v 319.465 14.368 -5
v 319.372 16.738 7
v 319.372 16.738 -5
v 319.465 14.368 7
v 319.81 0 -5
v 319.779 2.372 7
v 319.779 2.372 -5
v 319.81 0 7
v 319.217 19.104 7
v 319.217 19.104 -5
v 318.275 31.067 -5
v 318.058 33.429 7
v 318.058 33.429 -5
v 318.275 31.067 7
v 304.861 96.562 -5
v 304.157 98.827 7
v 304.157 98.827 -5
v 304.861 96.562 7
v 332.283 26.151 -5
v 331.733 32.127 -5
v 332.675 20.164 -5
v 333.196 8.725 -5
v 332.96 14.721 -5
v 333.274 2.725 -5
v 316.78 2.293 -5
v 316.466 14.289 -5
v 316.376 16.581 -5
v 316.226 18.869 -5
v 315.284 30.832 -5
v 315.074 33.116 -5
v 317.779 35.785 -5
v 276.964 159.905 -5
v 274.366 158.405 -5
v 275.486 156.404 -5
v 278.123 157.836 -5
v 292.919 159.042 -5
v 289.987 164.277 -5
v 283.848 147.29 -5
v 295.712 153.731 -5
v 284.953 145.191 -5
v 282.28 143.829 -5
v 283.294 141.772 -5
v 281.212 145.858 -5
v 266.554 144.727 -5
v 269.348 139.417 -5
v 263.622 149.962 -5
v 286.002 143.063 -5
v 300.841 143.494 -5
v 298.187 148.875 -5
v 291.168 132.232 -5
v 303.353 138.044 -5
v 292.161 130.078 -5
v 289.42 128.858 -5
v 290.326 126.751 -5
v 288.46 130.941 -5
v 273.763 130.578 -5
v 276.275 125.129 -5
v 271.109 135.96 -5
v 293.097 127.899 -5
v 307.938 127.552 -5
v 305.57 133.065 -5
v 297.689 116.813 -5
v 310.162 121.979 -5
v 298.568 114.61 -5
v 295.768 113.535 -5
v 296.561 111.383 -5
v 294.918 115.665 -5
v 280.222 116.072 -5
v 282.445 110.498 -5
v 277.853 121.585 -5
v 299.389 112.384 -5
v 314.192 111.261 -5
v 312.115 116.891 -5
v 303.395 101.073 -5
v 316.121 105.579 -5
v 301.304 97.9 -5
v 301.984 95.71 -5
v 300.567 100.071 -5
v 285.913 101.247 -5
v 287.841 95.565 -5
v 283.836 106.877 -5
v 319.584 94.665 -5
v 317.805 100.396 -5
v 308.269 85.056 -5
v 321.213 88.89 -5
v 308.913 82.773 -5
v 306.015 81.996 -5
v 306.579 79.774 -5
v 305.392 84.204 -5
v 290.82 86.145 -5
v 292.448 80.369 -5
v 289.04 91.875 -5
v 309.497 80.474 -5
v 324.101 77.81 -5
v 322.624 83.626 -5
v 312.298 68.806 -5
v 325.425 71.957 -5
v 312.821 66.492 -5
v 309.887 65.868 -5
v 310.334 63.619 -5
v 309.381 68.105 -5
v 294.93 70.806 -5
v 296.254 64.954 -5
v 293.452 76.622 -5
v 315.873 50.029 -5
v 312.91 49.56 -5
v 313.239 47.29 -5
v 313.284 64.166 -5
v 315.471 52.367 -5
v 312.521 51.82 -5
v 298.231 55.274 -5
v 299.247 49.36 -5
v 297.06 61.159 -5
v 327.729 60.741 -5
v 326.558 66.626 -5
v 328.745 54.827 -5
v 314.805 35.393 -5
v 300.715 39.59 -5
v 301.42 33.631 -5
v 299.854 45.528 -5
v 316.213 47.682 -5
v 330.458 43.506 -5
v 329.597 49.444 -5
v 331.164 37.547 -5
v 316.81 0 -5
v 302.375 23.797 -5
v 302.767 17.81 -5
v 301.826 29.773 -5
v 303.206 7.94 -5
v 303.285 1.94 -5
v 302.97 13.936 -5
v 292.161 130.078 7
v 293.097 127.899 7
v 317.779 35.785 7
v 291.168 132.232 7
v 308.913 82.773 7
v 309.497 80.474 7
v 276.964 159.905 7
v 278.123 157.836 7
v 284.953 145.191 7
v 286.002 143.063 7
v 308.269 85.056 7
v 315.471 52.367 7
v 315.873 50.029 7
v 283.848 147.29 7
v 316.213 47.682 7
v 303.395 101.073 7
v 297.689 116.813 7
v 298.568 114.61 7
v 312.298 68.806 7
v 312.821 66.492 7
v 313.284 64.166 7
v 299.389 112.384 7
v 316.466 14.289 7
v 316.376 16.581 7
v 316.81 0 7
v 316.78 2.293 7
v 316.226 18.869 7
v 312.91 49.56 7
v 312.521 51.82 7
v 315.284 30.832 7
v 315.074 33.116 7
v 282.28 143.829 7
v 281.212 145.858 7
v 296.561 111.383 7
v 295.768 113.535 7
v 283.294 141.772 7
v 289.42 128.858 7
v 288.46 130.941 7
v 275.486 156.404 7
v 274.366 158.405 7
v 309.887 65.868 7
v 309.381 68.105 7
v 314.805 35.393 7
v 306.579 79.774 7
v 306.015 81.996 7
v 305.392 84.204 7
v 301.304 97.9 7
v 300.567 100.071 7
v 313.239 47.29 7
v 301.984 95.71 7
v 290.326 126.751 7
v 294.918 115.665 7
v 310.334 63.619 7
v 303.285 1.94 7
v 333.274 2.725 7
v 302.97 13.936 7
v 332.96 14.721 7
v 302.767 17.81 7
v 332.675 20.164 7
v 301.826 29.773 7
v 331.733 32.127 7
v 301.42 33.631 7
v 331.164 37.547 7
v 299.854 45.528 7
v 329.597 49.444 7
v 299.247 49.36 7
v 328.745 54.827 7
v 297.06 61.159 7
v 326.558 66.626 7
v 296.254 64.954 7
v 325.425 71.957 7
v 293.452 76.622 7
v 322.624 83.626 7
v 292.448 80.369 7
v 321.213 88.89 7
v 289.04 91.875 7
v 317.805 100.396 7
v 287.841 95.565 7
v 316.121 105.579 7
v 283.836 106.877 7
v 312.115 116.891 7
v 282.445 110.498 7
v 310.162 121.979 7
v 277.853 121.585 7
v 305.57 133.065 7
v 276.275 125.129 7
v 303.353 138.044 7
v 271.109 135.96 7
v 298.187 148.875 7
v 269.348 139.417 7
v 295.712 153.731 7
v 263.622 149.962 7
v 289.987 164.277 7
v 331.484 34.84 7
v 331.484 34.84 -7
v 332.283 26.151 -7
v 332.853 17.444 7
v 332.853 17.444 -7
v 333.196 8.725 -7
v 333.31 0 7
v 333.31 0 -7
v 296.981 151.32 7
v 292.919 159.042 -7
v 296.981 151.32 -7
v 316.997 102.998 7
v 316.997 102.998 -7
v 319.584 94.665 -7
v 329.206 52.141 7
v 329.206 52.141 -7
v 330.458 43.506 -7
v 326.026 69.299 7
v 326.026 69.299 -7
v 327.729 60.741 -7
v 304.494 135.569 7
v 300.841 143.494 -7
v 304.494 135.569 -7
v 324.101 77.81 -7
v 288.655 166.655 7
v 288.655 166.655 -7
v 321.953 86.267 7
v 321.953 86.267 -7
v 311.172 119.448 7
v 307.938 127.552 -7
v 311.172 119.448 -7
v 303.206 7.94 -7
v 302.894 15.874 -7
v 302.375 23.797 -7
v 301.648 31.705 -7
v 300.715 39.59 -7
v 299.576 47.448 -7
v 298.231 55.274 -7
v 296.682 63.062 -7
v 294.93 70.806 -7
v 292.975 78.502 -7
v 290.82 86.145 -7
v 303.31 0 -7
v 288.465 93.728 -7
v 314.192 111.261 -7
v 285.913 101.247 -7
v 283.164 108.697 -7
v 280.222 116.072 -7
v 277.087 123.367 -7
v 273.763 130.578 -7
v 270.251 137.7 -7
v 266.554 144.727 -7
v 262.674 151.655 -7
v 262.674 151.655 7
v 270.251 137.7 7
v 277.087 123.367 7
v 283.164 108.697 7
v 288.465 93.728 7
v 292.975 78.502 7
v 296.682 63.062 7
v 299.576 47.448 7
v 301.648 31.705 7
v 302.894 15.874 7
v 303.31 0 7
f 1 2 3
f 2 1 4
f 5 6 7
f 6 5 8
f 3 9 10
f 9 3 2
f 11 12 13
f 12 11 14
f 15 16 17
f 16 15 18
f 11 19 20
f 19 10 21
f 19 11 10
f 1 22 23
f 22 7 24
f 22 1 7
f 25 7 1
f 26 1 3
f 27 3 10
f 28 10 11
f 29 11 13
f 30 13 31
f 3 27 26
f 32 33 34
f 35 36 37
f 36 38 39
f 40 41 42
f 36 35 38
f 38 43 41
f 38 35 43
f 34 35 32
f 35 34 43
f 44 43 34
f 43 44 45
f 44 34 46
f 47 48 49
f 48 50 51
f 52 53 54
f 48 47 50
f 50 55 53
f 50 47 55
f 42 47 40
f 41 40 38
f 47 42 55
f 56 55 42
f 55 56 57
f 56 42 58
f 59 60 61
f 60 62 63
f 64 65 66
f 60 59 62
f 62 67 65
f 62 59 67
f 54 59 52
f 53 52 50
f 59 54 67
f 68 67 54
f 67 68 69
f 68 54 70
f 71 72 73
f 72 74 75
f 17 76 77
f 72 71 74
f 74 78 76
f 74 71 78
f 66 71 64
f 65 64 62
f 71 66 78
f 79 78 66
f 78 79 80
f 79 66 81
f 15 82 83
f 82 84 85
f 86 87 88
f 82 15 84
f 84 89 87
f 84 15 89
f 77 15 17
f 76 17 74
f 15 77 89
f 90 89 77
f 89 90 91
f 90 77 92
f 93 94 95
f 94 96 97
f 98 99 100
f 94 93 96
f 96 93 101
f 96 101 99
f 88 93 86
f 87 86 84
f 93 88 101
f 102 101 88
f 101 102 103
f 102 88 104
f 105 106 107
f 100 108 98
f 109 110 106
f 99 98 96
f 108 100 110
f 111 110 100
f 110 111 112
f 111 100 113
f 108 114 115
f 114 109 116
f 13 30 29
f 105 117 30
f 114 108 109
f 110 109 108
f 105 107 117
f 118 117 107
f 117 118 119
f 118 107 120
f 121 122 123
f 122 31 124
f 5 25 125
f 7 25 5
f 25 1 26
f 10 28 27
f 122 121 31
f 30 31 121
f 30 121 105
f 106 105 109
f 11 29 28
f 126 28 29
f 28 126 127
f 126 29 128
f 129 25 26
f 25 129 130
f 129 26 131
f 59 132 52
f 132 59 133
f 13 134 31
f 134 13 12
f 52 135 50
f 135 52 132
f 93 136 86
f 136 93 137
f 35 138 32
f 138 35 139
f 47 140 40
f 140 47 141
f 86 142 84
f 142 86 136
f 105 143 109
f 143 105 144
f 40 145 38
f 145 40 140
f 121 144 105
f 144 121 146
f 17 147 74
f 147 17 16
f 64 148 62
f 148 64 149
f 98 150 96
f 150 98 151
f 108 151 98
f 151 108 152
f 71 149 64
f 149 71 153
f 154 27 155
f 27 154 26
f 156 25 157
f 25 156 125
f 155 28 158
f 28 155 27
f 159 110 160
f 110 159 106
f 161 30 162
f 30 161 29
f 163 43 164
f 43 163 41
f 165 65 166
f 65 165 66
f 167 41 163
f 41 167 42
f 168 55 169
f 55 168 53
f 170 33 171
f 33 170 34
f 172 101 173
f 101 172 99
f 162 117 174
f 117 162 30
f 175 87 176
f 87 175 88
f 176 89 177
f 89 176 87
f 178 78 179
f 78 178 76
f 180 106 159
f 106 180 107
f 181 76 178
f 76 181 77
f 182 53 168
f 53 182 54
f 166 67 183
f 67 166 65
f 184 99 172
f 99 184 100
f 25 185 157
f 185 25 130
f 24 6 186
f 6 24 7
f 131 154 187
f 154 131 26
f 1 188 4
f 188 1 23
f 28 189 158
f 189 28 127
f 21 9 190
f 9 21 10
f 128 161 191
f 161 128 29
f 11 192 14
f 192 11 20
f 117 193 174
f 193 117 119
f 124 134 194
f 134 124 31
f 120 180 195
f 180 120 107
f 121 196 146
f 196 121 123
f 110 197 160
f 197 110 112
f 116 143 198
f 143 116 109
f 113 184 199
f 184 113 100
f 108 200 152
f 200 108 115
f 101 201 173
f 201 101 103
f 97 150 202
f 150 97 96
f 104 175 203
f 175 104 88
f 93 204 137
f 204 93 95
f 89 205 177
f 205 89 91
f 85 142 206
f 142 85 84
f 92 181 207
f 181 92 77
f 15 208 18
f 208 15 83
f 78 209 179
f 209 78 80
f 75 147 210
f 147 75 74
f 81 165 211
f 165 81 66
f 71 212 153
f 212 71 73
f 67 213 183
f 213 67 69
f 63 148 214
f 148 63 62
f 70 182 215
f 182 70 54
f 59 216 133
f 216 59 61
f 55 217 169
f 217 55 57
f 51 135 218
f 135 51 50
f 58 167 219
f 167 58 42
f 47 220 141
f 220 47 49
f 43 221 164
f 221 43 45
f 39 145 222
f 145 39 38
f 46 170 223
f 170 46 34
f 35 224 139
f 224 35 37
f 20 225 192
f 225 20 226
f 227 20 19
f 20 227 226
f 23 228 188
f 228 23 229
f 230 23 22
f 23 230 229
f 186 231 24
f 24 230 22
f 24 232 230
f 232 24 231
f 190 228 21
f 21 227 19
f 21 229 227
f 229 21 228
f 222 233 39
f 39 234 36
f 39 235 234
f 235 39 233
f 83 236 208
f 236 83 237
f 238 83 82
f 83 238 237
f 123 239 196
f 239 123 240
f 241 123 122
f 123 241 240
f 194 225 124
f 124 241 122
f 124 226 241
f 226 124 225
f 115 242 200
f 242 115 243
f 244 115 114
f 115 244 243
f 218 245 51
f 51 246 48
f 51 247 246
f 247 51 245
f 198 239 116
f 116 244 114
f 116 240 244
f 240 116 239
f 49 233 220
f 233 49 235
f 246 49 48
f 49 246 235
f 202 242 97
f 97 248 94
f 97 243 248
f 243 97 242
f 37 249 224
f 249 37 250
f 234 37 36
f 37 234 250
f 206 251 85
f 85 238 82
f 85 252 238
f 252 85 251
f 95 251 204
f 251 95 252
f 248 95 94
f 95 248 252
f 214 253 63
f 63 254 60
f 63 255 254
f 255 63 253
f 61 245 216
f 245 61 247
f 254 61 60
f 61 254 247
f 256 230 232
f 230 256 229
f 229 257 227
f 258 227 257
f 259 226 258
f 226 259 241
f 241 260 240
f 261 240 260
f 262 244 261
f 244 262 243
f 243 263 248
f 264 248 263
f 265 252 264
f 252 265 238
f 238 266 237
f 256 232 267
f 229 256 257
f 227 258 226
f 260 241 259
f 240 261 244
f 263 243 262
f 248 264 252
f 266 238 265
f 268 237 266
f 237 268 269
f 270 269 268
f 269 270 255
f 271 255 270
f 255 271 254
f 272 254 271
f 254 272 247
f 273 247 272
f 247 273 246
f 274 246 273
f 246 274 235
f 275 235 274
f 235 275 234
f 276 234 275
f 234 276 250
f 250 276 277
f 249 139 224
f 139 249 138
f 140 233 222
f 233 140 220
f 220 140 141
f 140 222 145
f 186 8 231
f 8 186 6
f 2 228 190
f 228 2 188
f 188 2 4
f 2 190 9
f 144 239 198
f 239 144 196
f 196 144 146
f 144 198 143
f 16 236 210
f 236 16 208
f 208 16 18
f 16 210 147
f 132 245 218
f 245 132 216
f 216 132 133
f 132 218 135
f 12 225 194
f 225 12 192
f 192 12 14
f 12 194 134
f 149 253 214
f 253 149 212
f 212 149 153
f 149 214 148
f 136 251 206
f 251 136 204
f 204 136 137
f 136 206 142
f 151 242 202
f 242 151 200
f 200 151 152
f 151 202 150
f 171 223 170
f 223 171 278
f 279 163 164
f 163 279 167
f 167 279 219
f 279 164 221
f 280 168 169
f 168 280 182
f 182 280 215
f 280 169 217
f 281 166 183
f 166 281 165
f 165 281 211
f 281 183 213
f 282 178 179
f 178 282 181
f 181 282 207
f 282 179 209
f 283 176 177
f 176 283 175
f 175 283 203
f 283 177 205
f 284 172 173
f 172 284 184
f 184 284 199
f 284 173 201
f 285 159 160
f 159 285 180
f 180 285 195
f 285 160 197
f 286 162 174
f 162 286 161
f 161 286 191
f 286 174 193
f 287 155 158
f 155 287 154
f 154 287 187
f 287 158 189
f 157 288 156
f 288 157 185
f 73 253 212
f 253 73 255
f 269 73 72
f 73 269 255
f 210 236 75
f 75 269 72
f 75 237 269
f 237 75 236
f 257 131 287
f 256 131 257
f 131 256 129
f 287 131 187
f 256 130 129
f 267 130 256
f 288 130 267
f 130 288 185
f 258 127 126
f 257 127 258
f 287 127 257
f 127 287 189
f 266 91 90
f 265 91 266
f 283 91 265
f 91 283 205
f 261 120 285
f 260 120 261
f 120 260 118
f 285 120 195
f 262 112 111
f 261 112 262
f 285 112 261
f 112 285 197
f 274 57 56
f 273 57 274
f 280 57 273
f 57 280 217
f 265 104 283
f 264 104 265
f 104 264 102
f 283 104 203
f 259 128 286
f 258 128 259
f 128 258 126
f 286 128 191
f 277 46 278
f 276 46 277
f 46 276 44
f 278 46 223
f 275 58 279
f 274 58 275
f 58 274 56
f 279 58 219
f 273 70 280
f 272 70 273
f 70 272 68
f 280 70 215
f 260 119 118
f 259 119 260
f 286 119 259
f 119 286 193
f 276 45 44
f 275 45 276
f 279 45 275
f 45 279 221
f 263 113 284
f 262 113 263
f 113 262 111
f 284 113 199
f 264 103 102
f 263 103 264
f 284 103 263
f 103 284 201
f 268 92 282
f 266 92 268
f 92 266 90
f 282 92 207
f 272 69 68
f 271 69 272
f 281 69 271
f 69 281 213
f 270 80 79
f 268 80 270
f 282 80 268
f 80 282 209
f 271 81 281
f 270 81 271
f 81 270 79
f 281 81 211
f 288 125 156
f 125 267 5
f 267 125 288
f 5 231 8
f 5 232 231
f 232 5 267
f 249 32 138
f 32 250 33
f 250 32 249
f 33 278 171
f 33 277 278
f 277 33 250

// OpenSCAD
module ring (ring_height = 2,
    r1 = 333.310,
    r2 = 303.310,
    inner_gap = 3,
    gap = 12,
    sep_height = 12,
    $fn = 240) {

    r3 = (r1 + r2 + inner_gap) / 2;
    r4 = (r1 + r2 - inner_gap) / 2;

    difference() {
        difference() {
            cylinder(h = ring_height+sep_height, r1 = r1, r2 = r1, center = true);

            cylinder(h = ring_height+sep_height+1, r1 = r2, r2 = r2, center = true);
            translate([0, 0, ring_height]) difference() {
                cylinder(h = ring_height+sep_height, r1 = r3, r2 = r3, center = true);
                cylinder(h = ring_height+sep_height+1, r1 = r4, r2 = r4, center = true);
            }
            for (i = [90:100])
            rotate(i * 3+1.5){
                translate([0, (r1 + r2) / 2 - 1, ring_height/2+1]) {
                    cube(size = [gap, r1-r2+3, sep_height+2], center = true);
                }
            }
        };

        translate([0, 0, -(ring_height+sep_height)/2 - 1]) {
            translate([-r1-1, -r1-1, 0]) {
                cube([r1+1, 2*r1+1, sep_height + ring_height + 2], center = false);
            }
            translate([-r1-1, -r1-1, 0]) {
                cube([2*r1+2, r1+1, sep_height + ring_height + 2], center = false);
            }
            rotate(30) {
                cube([r1+1, r1+1, sep_height + ring_height + 2], center = false);
            }
        }
    }
}

module inv_ring (ring_height = 2,
    r1 = 333.310,
    r2 = 303.310,
    inner_gap = 3,
    gap = 12,
    sep_height = 12,
    $fn = 240,
    tolerance = 0.1) {


    rotate([0,180,180]) difference() {
        difference() {
            cylinder(h = ring_height, r1 = r1, r2 = r1, center = true);
            cylinder(h = ring_height+1, r1 = r2, r2 = r2, center = true);
        };
    
        translate([0, 0, -ring_height/2 - 1]) {
            translate([-r1-1, -r1-1, 0]) {
                cube([r1+1, 2*r1+1, sep_height + ring_height + 2], center = false);
            }
            translate([-r1-1, -r1-1, 0]) {
                cube([2*r1+2, r1+1, sep_height + ring_height + 2], center = false);
            }
            rotate(30) {
                cube([r1+1, r1+1, sep_height + ring_height + 2], center = false);
            }
        }

        translate([0, 0, -(sep_height+ring_height)/2]) ring(ring_height, r1, r2, inner_gap - tolerance*2, gap - tolerance*2, sep_height, $fn);
    }
}

//inv_ring();
ring();
